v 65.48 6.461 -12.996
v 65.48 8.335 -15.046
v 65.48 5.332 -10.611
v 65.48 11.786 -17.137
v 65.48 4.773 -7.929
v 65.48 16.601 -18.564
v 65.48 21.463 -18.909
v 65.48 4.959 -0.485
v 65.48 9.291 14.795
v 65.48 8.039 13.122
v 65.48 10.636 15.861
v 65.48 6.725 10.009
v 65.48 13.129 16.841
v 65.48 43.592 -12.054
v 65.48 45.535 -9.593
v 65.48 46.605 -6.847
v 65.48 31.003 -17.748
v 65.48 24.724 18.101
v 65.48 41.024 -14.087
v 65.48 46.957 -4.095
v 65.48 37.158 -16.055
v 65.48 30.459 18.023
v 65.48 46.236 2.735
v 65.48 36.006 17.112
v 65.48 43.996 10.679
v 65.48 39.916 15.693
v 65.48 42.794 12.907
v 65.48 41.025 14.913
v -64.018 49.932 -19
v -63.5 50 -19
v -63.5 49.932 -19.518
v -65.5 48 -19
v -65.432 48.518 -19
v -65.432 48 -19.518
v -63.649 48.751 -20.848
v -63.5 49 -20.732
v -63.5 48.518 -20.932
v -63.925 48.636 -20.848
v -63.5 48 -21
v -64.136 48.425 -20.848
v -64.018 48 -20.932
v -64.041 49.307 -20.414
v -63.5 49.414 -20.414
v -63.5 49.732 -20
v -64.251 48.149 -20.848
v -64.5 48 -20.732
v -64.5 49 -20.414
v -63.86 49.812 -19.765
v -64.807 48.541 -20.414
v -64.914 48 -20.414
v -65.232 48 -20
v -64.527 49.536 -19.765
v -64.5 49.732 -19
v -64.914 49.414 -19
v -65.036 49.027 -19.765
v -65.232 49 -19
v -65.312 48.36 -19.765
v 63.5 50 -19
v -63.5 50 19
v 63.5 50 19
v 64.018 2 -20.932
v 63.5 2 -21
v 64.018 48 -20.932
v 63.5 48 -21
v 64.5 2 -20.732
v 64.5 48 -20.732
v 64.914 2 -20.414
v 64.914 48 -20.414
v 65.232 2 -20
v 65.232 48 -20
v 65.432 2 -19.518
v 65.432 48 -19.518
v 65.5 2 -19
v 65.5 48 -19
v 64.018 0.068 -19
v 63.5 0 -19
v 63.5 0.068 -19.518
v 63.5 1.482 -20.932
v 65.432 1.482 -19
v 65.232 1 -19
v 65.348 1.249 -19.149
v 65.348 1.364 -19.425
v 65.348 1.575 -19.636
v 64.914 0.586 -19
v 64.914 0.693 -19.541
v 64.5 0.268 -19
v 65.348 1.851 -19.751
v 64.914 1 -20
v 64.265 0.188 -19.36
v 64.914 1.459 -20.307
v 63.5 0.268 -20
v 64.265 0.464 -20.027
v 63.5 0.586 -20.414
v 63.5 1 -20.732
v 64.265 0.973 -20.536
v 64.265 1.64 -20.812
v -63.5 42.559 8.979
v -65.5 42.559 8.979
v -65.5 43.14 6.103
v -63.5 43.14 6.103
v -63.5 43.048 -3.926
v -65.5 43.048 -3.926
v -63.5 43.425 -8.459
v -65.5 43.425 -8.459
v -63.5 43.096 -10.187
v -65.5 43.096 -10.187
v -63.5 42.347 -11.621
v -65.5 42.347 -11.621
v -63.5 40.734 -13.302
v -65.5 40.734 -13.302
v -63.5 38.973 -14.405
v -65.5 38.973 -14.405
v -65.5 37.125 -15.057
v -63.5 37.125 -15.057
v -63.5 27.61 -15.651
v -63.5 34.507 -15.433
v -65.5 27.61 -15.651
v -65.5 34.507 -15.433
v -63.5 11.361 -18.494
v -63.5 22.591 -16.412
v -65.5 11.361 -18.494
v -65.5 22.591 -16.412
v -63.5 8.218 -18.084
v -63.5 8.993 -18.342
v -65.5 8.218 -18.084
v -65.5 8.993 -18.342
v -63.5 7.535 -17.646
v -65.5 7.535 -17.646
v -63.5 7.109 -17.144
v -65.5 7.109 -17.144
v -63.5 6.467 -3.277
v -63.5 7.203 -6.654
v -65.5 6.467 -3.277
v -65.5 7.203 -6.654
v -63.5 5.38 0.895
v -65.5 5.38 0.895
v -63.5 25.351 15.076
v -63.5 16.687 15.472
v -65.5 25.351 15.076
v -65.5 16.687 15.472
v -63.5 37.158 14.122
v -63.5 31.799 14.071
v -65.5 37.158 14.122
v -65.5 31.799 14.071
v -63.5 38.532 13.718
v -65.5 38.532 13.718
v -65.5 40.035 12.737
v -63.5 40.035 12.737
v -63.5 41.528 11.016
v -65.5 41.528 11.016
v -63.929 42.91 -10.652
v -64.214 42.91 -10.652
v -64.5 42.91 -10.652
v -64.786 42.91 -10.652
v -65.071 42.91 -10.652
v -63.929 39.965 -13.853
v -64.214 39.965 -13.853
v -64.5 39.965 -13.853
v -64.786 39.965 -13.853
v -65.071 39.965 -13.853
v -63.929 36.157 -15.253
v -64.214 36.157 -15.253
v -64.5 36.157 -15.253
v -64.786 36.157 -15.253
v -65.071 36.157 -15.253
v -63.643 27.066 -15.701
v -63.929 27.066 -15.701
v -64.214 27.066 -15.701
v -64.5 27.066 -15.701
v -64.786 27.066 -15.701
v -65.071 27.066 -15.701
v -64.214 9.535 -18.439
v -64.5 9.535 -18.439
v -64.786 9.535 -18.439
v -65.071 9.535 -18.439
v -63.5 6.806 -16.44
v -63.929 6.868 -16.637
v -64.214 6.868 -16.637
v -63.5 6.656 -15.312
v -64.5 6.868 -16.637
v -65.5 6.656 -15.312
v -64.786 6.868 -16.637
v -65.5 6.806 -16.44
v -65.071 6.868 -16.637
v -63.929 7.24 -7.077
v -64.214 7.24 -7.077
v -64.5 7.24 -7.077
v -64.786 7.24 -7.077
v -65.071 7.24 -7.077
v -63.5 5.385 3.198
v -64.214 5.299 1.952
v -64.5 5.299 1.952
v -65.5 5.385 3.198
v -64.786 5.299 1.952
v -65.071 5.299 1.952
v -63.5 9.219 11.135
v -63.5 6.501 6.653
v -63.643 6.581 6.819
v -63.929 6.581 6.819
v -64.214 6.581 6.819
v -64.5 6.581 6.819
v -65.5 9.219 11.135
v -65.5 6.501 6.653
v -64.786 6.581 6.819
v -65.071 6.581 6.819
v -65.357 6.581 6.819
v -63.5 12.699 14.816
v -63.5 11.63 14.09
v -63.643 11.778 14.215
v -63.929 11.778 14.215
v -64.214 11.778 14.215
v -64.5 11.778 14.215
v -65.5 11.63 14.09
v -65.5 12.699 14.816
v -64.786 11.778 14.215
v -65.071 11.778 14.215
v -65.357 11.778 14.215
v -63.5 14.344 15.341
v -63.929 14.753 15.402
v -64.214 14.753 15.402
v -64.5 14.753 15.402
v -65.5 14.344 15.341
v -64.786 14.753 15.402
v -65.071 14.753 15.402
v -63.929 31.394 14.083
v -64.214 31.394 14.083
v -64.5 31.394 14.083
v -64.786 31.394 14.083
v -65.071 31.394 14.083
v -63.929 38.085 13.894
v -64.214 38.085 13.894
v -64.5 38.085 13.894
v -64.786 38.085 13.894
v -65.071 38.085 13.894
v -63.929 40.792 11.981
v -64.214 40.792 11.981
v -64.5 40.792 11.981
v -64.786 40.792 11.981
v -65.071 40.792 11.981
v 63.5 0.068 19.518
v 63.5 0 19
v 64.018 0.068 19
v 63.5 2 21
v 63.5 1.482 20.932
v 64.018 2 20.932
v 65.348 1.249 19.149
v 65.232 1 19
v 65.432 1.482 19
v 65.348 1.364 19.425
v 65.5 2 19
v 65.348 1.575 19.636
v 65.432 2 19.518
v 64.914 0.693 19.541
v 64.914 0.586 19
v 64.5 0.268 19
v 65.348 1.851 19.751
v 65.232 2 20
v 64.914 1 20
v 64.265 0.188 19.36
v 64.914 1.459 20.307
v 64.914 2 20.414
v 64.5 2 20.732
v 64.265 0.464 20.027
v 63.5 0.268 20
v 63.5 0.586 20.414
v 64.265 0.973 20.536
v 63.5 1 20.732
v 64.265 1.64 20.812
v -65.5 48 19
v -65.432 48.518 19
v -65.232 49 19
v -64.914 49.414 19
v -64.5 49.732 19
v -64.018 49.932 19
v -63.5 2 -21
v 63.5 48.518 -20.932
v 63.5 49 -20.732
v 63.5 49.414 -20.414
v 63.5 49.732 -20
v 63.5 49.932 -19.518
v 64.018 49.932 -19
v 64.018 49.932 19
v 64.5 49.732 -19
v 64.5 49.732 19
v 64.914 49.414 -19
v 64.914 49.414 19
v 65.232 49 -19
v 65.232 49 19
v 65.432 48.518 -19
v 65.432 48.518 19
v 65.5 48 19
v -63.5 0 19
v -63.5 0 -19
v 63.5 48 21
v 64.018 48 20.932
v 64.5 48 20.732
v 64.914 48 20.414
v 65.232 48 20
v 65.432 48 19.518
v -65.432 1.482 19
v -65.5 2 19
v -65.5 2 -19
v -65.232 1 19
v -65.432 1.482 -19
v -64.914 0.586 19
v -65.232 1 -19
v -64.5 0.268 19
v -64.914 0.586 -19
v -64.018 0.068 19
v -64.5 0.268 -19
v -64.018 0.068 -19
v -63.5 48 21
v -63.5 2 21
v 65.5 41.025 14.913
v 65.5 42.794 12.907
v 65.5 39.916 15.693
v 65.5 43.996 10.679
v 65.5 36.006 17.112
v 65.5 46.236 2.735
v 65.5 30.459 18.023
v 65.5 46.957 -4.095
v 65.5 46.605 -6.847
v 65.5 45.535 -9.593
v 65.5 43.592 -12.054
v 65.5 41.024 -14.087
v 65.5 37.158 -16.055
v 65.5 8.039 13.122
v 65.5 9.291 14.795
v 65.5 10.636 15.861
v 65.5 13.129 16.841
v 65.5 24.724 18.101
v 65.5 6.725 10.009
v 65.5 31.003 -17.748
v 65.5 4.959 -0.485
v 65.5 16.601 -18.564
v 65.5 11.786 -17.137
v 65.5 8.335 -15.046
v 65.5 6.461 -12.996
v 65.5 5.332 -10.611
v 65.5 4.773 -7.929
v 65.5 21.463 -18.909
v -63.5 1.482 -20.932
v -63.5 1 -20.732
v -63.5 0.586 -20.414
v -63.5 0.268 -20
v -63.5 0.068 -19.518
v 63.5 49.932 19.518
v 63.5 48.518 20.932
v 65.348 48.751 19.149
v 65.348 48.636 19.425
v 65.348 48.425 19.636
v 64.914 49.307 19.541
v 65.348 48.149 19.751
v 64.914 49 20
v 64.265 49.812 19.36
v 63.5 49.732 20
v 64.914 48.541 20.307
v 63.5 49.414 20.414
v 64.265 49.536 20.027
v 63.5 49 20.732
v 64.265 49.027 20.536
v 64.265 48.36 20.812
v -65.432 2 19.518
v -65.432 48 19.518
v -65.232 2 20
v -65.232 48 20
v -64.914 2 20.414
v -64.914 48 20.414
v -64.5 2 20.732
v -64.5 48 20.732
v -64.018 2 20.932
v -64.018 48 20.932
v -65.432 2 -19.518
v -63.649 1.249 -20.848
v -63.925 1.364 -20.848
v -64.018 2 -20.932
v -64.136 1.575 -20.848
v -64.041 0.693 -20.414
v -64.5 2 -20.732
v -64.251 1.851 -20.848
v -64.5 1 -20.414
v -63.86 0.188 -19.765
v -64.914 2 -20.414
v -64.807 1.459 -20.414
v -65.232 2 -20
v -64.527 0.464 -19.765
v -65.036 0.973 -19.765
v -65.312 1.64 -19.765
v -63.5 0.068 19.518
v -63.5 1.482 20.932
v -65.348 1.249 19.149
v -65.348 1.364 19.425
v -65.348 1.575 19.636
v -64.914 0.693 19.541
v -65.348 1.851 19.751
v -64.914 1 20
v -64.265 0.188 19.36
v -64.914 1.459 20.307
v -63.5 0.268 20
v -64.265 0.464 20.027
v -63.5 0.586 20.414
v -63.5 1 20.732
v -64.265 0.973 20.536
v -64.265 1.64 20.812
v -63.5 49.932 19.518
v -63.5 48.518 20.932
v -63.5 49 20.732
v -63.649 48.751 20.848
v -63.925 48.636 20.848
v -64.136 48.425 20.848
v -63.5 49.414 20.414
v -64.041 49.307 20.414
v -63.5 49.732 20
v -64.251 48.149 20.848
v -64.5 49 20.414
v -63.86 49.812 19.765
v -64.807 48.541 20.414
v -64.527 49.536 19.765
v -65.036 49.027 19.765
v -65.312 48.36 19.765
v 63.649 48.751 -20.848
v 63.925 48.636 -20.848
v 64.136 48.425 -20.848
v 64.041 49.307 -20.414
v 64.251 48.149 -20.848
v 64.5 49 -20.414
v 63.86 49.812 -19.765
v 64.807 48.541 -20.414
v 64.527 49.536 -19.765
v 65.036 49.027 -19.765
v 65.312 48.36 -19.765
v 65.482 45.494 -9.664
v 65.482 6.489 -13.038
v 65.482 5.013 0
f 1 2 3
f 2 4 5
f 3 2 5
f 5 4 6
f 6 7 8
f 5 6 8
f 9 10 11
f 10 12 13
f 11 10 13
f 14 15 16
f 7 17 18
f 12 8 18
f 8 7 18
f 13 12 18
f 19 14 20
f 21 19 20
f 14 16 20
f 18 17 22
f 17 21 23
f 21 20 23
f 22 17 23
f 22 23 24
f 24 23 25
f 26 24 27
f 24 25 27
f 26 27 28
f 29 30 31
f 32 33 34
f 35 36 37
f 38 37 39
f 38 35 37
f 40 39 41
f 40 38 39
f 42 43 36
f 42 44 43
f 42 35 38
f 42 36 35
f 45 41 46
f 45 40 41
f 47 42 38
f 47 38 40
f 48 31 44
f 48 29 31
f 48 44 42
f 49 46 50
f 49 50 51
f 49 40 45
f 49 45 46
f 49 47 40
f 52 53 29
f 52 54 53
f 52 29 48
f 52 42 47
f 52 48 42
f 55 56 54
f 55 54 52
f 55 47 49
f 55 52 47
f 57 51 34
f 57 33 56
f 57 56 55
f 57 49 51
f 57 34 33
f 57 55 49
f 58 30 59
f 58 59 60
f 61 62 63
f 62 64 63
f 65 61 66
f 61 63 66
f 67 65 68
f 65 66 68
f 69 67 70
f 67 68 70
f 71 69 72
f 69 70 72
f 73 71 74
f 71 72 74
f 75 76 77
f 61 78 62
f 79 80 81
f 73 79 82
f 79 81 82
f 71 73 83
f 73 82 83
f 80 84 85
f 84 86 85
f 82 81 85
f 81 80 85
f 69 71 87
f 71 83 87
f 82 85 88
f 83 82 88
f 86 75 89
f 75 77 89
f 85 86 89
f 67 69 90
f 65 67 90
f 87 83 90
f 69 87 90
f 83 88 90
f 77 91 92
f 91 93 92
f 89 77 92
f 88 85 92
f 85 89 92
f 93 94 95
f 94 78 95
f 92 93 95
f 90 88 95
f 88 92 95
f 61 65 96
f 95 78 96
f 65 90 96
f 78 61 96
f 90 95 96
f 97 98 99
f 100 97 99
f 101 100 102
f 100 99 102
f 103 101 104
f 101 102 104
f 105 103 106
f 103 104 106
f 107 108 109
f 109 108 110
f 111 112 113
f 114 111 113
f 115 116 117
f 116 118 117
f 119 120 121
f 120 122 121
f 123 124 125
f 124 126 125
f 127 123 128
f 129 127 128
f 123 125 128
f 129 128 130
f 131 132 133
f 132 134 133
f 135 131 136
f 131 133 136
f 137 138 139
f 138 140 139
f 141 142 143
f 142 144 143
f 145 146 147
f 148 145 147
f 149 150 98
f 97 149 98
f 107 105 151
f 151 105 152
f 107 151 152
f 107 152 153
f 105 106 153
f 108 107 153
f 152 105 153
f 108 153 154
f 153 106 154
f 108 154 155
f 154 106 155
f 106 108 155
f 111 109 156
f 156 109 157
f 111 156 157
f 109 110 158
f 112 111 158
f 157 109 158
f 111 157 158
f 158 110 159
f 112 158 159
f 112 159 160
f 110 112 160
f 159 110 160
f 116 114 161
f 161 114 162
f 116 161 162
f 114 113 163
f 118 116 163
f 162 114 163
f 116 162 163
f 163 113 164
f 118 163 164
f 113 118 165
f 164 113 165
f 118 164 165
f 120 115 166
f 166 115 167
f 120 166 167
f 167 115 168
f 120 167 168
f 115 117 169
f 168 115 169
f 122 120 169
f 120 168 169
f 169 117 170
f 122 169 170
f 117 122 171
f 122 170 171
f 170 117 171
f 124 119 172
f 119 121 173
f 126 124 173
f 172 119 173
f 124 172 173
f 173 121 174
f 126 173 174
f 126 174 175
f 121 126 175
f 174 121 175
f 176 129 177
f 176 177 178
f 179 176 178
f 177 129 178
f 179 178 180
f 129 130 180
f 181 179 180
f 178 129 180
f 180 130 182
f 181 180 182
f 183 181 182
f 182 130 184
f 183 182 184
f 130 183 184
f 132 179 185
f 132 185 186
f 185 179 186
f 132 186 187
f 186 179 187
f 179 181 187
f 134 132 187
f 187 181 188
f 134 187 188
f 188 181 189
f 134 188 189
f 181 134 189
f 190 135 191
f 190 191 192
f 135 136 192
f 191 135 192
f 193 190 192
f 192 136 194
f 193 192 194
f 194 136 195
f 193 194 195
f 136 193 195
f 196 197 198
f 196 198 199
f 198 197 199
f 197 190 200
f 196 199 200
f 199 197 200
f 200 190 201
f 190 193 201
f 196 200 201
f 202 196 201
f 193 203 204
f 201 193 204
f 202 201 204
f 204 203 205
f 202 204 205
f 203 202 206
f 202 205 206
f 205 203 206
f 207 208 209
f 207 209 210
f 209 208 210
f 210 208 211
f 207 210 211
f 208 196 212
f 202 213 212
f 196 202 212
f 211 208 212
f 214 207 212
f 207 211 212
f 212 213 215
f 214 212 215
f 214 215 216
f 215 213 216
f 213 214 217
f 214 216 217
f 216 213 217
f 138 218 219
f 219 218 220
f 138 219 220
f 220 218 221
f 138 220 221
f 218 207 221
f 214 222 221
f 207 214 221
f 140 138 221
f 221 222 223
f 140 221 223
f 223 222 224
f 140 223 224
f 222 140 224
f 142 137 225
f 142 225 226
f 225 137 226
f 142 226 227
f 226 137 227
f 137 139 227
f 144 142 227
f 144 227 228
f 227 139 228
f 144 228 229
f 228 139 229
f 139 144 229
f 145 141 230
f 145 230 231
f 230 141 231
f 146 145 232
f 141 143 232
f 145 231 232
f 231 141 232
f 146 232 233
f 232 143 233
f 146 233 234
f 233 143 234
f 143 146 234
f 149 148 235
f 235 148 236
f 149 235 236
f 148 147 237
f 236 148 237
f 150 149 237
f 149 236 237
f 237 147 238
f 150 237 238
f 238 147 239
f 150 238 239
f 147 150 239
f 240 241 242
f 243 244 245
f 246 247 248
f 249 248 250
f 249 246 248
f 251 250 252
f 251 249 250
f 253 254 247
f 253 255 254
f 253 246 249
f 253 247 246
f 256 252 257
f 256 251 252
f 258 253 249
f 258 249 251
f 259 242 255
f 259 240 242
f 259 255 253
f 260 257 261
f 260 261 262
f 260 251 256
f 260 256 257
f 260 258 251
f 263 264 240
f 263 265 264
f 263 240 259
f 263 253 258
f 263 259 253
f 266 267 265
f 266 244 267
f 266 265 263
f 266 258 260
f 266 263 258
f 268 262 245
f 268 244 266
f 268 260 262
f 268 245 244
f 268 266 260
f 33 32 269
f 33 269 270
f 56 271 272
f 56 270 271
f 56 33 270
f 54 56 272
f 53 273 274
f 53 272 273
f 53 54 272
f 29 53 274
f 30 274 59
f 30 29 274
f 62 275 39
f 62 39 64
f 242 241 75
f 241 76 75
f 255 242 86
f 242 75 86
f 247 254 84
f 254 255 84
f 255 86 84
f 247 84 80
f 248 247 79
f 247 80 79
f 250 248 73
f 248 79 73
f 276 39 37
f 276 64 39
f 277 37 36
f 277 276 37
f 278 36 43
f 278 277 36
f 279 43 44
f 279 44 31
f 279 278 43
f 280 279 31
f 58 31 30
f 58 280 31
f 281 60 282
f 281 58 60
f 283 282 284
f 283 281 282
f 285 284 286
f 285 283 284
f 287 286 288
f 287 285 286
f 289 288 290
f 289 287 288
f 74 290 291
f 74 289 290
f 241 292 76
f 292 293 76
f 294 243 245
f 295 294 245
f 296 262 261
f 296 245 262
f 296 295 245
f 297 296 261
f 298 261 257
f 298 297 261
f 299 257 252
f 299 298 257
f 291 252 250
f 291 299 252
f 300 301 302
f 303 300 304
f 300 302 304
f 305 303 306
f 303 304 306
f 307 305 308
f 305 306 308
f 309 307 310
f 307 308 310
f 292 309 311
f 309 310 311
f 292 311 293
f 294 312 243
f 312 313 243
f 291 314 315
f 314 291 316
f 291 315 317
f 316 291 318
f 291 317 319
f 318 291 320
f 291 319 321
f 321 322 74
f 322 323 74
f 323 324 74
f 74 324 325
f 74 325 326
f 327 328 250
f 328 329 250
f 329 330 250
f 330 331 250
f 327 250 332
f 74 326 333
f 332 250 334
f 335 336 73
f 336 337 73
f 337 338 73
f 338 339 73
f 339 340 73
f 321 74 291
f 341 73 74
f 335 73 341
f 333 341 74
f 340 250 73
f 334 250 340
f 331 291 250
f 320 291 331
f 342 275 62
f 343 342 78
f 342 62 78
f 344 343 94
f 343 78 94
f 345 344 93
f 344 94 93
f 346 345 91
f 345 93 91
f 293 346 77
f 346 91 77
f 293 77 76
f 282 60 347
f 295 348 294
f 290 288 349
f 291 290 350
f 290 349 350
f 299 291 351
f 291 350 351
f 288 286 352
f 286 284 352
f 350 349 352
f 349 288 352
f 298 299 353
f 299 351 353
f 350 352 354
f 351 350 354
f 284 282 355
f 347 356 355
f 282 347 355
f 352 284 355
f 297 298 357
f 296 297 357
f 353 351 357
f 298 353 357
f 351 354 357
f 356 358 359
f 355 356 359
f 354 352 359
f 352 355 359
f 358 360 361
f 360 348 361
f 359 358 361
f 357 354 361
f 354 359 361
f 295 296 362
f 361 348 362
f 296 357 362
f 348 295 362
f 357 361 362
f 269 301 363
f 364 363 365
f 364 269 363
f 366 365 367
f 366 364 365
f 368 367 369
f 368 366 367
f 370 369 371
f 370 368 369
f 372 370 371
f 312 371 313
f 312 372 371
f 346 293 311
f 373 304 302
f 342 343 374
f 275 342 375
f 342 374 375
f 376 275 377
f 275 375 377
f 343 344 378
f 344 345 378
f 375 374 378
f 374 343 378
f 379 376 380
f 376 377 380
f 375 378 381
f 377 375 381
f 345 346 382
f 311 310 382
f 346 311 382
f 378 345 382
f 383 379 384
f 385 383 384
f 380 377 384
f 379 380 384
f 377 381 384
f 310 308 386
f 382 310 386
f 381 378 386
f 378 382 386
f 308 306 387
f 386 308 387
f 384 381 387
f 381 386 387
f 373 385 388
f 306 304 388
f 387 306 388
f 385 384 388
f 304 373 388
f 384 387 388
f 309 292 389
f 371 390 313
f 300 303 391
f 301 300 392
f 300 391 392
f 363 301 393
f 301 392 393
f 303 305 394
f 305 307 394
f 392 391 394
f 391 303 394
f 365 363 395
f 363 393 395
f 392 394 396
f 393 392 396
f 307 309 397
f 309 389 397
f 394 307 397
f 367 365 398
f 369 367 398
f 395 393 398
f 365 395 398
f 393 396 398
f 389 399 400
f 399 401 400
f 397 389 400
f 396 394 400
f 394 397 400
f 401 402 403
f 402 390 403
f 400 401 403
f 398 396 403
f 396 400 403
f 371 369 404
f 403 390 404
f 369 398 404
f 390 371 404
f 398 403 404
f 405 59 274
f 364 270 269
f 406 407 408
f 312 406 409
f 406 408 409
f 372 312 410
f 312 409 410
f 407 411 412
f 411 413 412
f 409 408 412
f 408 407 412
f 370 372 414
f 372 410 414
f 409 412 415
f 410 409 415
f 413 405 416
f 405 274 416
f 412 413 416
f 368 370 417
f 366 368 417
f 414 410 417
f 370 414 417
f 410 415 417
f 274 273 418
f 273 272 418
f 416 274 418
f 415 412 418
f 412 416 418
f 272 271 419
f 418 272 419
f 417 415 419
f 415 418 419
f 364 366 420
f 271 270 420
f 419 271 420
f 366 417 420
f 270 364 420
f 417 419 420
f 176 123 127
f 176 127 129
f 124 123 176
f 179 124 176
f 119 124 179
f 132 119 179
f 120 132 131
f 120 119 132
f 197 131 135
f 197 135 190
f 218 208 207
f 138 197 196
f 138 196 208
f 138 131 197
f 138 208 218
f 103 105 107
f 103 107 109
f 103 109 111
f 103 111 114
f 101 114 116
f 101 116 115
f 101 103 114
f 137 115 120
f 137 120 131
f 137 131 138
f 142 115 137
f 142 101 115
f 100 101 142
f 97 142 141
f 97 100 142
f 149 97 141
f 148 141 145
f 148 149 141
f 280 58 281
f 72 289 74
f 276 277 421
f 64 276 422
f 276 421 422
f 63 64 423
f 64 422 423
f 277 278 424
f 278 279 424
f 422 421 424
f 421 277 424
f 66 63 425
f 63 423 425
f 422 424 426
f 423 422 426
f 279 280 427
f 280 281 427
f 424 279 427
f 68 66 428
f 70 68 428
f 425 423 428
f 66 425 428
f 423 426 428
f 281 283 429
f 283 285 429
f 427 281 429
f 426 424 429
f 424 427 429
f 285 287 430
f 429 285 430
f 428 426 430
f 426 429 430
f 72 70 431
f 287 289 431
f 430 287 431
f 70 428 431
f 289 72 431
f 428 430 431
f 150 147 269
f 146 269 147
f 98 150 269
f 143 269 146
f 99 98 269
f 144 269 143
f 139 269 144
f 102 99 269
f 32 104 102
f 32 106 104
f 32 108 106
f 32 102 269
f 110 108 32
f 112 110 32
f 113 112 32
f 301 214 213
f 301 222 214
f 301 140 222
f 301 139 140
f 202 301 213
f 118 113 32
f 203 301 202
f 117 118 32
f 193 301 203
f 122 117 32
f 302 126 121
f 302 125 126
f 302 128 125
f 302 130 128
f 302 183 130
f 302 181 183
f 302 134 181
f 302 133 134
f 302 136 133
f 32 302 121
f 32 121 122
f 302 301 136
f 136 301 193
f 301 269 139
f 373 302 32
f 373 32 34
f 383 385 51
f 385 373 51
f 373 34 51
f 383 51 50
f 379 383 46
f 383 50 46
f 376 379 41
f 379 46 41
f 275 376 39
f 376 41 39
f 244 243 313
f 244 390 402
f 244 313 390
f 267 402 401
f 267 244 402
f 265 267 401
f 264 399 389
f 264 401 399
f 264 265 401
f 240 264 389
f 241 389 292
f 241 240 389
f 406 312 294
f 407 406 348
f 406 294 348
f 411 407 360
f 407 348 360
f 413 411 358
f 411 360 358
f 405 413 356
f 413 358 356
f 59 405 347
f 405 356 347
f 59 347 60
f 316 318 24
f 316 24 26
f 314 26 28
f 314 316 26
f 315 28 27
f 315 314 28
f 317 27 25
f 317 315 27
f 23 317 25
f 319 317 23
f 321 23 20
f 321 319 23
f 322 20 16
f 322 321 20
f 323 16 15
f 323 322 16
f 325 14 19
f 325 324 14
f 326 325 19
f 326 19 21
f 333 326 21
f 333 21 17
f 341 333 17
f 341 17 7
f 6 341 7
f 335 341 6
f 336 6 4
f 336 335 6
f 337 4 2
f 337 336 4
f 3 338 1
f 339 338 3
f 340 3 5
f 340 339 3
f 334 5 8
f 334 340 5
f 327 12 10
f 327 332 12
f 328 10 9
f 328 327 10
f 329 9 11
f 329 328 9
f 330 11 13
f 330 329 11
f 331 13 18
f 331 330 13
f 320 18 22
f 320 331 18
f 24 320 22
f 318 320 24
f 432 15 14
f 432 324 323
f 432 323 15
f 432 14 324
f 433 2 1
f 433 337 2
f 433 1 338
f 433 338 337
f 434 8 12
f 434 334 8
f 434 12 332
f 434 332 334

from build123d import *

# Parameters (mm, degrees)
CROQUIS2_W              = 131
CROQUIS2_H              = 42
SALIENTE_EXTRUIR1_DEPTH = 50
CORTAR_EXTRUIR1_DEPTH   = 0.02
REDONDEO1_R             = 2
CORTAR_EXTRUIR2_DEPTH   = 2


with BuildPart() as part:
    # Croquis2 → Saliente-Extruir1 (new body)
    with BuildSketch(Plane(origin=(0, 0, 0), x_dir=(1, 0, 0), z_dir=(0, 1, 0))):
        Rectangle(CROQUIS2_W, CROQUIS2_H)
    extrude(amount=SALIENTE_EXTRUIR1_DEPTH)

    # Croquis3 → Cortar-Extruir1 (cut)
    with BuildSketch(Plane(origin=(65.5, 0, 0), x_dir=(0, 0, -1), z_dir=(1, 0, 0))):
        with BuildLine():
            add(Edge.make_bspline(
                [(-17.112114557, 36.006296002), (-16.769875687, 37.42301657), (-15.057082788, 43.088866065), (-3.859638422, 46.362485269), (8.679768808, 48.154839826), (16.162022742, 38.858188467), (18.505026308, 27.939639658), (19.779716297, 16.168451708), (13.261180985, 3.841515951), (3.038463882, 4.622376827), (-6.441014061, 5.799969078), (-16.666974229, 7.476700806), (-17.543271482, 18.80297348), (-18.518864255, 27.195655921), (-17.793454872, 33.185842442), (-17.112114557, 36.006296002)],
                knots=[0, 0, 0, 0, 0.032914091, 0.131790069, 0.239123046, 0.300139284, 0.384993454, 0.497153717, 0.570211354, 0.671370628, 0.697843576, 0.799265567, 0.861163185, 0.934473554, 1, 1, 1, 1], degree=3))
        make_face()
    extrude(amount=-CORTAR_EXTRUIR1_DEPTH, mode=Mode.SUBTRACT)

    # Redondeo1
    redondeo1_edges = [part.edges().sort_by_distance(p)[0] for p in [
        (-65.5, 50, 0),
        (0, 50, 21),
        (65.5, 50, 0),
        (0, 0, 21),
        (-65.5, 0, 0),
        (0, 0, -21),
        (65.5, 0, 0),
        (0, 50, -21),
        (65.5, 25, 21),
        (-65.5, 25, 21),
        (-65.5, 25, -21),
        (65.5, 25, -21),
    ]]
    fillet(redondeo1_edges, radius=REDONDEO1_R)

    # Croquis4 → Cortar-Extruir2 (cut)
    with BuildSketch(Plane.ZY.offset(65.5)):
        with BuildLine():
            add(Edge.make_bspline(
                [(8.978661577, 42.558783476), (5.375949454, 43.867570791), (-1.149836325, 41.739656252), (-9.762030871, 44.554797073), (-16.510781784, 37.672215383), (-13.639271555, 25.861697119), (-23.105390544, 3.346347644), (-6.65065098, 8.75557637), (2.285497568, 3.421967675), (9.798682665, 8.179200373), (16.633242319, 13.22394434), (14.828389321, 19.837598078), (15.335298358, 26.153672342), (13.358929545, 31.415036468), (15.235898272, 38.524529705), (11.052519969, 41.805395623), (8.978661577, 42.558783476)],
                knots=[0, 0, 0, 0, 0.09132038, 0.159387605, 0.195313945, 0.300499967, 0.464636293, 0.542295544, 0.617262826, 0.702219659, 0.735857869, 0.814488947, 0.839285493, 0.891602027, 0.947432509, 1, 1, 1, 1], degree=3))
        make_face()
    extrude(amount=-CORTAR_EXTRUIR2_DEPTH, mode=Mode.SUBTRACT)


solid = part.part
